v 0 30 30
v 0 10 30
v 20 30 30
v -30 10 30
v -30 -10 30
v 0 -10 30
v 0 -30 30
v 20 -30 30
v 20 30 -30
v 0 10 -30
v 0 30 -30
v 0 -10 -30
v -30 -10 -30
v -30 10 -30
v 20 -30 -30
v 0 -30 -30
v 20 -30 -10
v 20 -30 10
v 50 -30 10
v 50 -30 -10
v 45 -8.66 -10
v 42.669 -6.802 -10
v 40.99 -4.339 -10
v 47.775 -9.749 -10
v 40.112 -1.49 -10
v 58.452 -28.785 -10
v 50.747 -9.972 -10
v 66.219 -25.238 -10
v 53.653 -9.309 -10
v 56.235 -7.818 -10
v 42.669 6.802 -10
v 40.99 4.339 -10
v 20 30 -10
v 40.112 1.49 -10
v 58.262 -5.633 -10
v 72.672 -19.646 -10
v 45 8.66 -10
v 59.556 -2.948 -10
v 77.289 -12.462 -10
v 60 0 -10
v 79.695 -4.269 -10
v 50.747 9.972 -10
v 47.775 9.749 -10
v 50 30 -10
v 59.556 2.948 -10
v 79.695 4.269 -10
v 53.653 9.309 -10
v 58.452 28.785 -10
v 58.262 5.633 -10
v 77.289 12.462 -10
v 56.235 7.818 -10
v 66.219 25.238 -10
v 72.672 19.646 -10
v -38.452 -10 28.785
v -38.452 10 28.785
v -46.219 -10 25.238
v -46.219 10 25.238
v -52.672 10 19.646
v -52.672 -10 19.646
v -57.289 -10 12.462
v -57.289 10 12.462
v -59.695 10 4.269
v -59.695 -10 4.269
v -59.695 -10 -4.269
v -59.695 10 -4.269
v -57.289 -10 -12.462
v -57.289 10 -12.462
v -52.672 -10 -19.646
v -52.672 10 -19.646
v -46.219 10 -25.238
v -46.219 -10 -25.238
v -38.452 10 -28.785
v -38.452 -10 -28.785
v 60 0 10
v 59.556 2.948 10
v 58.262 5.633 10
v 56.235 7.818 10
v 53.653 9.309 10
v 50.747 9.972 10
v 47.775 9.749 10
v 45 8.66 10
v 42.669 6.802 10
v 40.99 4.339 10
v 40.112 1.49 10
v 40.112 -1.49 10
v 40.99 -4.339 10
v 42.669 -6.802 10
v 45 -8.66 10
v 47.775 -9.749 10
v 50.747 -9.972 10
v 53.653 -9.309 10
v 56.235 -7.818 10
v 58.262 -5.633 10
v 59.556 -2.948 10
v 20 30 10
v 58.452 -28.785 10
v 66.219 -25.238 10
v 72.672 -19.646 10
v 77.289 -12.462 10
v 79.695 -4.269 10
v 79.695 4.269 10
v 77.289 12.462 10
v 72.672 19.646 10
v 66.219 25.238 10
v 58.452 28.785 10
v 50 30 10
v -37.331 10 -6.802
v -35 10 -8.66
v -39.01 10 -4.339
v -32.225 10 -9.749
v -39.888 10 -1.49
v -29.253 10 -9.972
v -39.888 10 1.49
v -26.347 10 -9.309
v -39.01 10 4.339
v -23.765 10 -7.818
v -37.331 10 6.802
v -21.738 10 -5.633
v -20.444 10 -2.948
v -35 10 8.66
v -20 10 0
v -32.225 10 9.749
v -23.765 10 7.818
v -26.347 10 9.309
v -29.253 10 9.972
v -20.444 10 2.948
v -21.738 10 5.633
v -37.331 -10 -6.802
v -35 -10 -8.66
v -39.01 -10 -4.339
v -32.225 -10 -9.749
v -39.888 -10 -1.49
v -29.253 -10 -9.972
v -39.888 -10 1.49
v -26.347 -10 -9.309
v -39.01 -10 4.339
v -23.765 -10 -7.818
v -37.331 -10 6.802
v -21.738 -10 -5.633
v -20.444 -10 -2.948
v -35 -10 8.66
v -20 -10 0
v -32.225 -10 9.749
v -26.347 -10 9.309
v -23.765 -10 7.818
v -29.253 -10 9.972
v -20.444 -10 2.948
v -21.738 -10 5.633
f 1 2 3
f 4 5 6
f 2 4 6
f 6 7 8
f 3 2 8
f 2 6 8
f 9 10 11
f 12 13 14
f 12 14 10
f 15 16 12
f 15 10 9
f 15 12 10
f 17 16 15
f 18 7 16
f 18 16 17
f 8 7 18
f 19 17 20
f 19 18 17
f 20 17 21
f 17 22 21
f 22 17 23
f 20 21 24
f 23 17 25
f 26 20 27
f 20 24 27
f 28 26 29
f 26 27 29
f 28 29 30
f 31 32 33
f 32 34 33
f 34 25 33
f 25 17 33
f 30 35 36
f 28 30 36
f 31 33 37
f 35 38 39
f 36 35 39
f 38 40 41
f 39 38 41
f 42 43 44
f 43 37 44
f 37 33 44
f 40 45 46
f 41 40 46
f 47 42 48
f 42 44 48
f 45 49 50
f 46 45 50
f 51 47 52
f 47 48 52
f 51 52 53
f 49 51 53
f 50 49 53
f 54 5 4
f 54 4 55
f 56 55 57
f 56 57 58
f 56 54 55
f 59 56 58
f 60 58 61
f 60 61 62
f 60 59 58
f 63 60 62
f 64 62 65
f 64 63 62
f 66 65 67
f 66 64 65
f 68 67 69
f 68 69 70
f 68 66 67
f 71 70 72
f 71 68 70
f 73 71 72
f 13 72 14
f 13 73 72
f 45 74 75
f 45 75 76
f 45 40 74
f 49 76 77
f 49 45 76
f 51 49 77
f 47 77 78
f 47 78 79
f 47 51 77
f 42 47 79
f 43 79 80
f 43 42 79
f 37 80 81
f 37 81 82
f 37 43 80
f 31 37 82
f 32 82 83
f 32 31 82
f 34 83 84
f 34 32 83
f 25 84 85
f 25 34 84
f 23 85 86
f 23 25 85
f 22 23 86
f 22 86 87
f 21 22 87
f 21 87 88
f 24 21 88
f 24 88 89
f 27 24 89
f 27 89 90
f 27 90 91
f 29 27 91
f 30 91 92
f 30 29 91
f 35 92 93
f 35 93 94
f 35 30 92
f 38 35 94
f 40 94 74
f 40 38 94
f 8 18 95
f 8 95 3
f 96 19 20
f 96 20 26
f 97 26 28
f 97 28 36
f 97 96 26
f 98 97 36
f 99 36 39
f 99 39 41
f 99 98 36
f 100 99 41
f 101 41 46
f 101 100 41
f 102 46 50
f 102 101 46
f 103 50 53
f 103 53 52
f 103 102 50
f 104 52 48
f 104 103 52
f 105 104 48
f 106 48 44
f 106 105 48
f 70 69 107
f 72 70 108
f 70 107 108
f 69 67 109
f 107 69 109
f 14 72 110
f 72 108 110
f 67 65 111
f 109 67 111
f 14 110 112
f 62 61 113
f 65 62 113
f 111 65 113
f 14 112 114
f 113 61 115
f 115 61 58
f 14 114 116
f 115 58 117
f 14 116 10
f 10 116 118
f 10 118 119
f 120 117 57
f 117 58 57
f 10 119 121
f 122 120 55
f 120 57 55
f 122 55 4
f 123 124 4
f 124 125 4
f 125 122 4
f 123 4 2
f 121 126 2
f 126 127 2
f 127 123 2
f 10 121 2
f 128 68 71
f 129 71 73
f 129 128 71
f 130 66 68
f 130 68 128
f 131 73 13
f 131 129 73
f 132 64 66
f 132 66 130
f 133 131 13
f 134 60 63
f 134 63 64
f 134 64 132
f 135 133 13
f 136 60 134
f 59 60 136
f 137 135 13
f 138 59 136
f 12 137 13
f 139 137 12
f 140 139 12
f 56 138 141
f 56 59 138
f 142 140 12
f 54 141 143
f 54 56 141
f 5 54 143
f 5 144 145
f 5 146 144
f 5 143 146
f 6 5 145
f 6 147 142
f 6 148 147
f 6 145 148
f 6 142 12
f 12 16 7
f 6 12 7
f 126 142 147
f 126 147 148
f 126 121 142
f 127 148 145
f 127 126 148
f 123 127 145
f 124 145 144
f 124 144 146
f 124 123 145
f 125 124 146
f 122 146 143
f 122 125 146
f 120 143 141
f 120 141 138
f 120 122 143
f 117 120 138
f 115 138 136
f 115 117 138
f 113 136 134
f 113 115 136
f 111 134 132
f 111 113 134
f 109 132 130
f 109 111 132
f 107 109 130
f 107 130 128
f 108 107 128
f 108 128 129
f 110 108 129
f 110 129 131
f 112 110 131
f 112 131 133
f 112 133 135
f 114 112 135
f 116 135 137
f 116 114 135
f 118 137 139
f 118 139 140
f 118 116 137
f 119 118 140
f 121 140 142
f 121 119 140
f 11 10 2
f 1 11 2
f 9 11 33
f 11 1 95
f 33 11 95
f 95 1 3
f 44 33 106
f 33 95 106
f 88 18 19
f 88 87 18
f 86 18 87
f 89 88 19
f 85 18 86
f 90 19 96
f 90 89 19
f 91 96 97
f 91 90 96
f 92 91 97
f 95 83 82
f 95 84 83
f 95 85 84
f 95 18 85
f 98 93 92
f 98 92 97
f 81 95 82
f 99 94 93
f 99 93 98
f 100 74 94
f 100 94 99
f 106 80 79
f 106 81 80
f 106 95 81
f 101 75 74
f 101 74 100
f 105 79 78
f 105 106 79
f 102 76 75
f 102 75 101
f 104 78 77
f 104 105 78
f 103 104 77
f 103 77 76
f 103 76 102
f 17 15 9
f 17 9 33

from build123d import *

# Parameters (mm, degrees)
F0_W     = 20
F0_H     = 60
F1_DEPTH = 30
F0_R     = 10
F2_DEPTH = 10
F3_R     = 10
F4_DEPTH = 10


with BuildPart() as f1:
    # F0 (on Front) → F1 (new body, symmetric)
    with BuildSketch(Plane.XZ):
        with Locations((10, 0)):
            Rectangle(F0_W, F0_H)
    extrude(amount=F1_DEPTH, both=True)

    # F0 (on Front) → F2 (join, symmetric)
    with BuildSketch(Plane.XZ):
        with BuildLine():
            Line((0, -30), (0, 30))
            Line((0, 30), (-30, 30))
            ThreePointArc((-30, 30), (-60, 0), (-30, -30))
            Line((-30, -30), (0, -30))
        make_face()
        with Locations((-30, 0)):
            Circle(F0_R, mode=Mode.SUBTRACT)
    extrude(amount=F2_DEPTH, both=True)

    # F3 (on Top) → F4 (join, symmetric)
    with BuildSketch(Plane.XY):
        with BuildLine():
            Line((20, 30), (20, -30))
            Line((20, -30), (50, -30))
            ThreePointArc((50, -30), (80, 0), (50, 30))
            Line((50, 30), (20, 30))
        make_face()
        with Locations((50, 0)):
            Circle(F3_R, mode=Mode.SUBTRACT)
    extrude(amount=F4_DEPTH, both=True)


solid = f1.part
